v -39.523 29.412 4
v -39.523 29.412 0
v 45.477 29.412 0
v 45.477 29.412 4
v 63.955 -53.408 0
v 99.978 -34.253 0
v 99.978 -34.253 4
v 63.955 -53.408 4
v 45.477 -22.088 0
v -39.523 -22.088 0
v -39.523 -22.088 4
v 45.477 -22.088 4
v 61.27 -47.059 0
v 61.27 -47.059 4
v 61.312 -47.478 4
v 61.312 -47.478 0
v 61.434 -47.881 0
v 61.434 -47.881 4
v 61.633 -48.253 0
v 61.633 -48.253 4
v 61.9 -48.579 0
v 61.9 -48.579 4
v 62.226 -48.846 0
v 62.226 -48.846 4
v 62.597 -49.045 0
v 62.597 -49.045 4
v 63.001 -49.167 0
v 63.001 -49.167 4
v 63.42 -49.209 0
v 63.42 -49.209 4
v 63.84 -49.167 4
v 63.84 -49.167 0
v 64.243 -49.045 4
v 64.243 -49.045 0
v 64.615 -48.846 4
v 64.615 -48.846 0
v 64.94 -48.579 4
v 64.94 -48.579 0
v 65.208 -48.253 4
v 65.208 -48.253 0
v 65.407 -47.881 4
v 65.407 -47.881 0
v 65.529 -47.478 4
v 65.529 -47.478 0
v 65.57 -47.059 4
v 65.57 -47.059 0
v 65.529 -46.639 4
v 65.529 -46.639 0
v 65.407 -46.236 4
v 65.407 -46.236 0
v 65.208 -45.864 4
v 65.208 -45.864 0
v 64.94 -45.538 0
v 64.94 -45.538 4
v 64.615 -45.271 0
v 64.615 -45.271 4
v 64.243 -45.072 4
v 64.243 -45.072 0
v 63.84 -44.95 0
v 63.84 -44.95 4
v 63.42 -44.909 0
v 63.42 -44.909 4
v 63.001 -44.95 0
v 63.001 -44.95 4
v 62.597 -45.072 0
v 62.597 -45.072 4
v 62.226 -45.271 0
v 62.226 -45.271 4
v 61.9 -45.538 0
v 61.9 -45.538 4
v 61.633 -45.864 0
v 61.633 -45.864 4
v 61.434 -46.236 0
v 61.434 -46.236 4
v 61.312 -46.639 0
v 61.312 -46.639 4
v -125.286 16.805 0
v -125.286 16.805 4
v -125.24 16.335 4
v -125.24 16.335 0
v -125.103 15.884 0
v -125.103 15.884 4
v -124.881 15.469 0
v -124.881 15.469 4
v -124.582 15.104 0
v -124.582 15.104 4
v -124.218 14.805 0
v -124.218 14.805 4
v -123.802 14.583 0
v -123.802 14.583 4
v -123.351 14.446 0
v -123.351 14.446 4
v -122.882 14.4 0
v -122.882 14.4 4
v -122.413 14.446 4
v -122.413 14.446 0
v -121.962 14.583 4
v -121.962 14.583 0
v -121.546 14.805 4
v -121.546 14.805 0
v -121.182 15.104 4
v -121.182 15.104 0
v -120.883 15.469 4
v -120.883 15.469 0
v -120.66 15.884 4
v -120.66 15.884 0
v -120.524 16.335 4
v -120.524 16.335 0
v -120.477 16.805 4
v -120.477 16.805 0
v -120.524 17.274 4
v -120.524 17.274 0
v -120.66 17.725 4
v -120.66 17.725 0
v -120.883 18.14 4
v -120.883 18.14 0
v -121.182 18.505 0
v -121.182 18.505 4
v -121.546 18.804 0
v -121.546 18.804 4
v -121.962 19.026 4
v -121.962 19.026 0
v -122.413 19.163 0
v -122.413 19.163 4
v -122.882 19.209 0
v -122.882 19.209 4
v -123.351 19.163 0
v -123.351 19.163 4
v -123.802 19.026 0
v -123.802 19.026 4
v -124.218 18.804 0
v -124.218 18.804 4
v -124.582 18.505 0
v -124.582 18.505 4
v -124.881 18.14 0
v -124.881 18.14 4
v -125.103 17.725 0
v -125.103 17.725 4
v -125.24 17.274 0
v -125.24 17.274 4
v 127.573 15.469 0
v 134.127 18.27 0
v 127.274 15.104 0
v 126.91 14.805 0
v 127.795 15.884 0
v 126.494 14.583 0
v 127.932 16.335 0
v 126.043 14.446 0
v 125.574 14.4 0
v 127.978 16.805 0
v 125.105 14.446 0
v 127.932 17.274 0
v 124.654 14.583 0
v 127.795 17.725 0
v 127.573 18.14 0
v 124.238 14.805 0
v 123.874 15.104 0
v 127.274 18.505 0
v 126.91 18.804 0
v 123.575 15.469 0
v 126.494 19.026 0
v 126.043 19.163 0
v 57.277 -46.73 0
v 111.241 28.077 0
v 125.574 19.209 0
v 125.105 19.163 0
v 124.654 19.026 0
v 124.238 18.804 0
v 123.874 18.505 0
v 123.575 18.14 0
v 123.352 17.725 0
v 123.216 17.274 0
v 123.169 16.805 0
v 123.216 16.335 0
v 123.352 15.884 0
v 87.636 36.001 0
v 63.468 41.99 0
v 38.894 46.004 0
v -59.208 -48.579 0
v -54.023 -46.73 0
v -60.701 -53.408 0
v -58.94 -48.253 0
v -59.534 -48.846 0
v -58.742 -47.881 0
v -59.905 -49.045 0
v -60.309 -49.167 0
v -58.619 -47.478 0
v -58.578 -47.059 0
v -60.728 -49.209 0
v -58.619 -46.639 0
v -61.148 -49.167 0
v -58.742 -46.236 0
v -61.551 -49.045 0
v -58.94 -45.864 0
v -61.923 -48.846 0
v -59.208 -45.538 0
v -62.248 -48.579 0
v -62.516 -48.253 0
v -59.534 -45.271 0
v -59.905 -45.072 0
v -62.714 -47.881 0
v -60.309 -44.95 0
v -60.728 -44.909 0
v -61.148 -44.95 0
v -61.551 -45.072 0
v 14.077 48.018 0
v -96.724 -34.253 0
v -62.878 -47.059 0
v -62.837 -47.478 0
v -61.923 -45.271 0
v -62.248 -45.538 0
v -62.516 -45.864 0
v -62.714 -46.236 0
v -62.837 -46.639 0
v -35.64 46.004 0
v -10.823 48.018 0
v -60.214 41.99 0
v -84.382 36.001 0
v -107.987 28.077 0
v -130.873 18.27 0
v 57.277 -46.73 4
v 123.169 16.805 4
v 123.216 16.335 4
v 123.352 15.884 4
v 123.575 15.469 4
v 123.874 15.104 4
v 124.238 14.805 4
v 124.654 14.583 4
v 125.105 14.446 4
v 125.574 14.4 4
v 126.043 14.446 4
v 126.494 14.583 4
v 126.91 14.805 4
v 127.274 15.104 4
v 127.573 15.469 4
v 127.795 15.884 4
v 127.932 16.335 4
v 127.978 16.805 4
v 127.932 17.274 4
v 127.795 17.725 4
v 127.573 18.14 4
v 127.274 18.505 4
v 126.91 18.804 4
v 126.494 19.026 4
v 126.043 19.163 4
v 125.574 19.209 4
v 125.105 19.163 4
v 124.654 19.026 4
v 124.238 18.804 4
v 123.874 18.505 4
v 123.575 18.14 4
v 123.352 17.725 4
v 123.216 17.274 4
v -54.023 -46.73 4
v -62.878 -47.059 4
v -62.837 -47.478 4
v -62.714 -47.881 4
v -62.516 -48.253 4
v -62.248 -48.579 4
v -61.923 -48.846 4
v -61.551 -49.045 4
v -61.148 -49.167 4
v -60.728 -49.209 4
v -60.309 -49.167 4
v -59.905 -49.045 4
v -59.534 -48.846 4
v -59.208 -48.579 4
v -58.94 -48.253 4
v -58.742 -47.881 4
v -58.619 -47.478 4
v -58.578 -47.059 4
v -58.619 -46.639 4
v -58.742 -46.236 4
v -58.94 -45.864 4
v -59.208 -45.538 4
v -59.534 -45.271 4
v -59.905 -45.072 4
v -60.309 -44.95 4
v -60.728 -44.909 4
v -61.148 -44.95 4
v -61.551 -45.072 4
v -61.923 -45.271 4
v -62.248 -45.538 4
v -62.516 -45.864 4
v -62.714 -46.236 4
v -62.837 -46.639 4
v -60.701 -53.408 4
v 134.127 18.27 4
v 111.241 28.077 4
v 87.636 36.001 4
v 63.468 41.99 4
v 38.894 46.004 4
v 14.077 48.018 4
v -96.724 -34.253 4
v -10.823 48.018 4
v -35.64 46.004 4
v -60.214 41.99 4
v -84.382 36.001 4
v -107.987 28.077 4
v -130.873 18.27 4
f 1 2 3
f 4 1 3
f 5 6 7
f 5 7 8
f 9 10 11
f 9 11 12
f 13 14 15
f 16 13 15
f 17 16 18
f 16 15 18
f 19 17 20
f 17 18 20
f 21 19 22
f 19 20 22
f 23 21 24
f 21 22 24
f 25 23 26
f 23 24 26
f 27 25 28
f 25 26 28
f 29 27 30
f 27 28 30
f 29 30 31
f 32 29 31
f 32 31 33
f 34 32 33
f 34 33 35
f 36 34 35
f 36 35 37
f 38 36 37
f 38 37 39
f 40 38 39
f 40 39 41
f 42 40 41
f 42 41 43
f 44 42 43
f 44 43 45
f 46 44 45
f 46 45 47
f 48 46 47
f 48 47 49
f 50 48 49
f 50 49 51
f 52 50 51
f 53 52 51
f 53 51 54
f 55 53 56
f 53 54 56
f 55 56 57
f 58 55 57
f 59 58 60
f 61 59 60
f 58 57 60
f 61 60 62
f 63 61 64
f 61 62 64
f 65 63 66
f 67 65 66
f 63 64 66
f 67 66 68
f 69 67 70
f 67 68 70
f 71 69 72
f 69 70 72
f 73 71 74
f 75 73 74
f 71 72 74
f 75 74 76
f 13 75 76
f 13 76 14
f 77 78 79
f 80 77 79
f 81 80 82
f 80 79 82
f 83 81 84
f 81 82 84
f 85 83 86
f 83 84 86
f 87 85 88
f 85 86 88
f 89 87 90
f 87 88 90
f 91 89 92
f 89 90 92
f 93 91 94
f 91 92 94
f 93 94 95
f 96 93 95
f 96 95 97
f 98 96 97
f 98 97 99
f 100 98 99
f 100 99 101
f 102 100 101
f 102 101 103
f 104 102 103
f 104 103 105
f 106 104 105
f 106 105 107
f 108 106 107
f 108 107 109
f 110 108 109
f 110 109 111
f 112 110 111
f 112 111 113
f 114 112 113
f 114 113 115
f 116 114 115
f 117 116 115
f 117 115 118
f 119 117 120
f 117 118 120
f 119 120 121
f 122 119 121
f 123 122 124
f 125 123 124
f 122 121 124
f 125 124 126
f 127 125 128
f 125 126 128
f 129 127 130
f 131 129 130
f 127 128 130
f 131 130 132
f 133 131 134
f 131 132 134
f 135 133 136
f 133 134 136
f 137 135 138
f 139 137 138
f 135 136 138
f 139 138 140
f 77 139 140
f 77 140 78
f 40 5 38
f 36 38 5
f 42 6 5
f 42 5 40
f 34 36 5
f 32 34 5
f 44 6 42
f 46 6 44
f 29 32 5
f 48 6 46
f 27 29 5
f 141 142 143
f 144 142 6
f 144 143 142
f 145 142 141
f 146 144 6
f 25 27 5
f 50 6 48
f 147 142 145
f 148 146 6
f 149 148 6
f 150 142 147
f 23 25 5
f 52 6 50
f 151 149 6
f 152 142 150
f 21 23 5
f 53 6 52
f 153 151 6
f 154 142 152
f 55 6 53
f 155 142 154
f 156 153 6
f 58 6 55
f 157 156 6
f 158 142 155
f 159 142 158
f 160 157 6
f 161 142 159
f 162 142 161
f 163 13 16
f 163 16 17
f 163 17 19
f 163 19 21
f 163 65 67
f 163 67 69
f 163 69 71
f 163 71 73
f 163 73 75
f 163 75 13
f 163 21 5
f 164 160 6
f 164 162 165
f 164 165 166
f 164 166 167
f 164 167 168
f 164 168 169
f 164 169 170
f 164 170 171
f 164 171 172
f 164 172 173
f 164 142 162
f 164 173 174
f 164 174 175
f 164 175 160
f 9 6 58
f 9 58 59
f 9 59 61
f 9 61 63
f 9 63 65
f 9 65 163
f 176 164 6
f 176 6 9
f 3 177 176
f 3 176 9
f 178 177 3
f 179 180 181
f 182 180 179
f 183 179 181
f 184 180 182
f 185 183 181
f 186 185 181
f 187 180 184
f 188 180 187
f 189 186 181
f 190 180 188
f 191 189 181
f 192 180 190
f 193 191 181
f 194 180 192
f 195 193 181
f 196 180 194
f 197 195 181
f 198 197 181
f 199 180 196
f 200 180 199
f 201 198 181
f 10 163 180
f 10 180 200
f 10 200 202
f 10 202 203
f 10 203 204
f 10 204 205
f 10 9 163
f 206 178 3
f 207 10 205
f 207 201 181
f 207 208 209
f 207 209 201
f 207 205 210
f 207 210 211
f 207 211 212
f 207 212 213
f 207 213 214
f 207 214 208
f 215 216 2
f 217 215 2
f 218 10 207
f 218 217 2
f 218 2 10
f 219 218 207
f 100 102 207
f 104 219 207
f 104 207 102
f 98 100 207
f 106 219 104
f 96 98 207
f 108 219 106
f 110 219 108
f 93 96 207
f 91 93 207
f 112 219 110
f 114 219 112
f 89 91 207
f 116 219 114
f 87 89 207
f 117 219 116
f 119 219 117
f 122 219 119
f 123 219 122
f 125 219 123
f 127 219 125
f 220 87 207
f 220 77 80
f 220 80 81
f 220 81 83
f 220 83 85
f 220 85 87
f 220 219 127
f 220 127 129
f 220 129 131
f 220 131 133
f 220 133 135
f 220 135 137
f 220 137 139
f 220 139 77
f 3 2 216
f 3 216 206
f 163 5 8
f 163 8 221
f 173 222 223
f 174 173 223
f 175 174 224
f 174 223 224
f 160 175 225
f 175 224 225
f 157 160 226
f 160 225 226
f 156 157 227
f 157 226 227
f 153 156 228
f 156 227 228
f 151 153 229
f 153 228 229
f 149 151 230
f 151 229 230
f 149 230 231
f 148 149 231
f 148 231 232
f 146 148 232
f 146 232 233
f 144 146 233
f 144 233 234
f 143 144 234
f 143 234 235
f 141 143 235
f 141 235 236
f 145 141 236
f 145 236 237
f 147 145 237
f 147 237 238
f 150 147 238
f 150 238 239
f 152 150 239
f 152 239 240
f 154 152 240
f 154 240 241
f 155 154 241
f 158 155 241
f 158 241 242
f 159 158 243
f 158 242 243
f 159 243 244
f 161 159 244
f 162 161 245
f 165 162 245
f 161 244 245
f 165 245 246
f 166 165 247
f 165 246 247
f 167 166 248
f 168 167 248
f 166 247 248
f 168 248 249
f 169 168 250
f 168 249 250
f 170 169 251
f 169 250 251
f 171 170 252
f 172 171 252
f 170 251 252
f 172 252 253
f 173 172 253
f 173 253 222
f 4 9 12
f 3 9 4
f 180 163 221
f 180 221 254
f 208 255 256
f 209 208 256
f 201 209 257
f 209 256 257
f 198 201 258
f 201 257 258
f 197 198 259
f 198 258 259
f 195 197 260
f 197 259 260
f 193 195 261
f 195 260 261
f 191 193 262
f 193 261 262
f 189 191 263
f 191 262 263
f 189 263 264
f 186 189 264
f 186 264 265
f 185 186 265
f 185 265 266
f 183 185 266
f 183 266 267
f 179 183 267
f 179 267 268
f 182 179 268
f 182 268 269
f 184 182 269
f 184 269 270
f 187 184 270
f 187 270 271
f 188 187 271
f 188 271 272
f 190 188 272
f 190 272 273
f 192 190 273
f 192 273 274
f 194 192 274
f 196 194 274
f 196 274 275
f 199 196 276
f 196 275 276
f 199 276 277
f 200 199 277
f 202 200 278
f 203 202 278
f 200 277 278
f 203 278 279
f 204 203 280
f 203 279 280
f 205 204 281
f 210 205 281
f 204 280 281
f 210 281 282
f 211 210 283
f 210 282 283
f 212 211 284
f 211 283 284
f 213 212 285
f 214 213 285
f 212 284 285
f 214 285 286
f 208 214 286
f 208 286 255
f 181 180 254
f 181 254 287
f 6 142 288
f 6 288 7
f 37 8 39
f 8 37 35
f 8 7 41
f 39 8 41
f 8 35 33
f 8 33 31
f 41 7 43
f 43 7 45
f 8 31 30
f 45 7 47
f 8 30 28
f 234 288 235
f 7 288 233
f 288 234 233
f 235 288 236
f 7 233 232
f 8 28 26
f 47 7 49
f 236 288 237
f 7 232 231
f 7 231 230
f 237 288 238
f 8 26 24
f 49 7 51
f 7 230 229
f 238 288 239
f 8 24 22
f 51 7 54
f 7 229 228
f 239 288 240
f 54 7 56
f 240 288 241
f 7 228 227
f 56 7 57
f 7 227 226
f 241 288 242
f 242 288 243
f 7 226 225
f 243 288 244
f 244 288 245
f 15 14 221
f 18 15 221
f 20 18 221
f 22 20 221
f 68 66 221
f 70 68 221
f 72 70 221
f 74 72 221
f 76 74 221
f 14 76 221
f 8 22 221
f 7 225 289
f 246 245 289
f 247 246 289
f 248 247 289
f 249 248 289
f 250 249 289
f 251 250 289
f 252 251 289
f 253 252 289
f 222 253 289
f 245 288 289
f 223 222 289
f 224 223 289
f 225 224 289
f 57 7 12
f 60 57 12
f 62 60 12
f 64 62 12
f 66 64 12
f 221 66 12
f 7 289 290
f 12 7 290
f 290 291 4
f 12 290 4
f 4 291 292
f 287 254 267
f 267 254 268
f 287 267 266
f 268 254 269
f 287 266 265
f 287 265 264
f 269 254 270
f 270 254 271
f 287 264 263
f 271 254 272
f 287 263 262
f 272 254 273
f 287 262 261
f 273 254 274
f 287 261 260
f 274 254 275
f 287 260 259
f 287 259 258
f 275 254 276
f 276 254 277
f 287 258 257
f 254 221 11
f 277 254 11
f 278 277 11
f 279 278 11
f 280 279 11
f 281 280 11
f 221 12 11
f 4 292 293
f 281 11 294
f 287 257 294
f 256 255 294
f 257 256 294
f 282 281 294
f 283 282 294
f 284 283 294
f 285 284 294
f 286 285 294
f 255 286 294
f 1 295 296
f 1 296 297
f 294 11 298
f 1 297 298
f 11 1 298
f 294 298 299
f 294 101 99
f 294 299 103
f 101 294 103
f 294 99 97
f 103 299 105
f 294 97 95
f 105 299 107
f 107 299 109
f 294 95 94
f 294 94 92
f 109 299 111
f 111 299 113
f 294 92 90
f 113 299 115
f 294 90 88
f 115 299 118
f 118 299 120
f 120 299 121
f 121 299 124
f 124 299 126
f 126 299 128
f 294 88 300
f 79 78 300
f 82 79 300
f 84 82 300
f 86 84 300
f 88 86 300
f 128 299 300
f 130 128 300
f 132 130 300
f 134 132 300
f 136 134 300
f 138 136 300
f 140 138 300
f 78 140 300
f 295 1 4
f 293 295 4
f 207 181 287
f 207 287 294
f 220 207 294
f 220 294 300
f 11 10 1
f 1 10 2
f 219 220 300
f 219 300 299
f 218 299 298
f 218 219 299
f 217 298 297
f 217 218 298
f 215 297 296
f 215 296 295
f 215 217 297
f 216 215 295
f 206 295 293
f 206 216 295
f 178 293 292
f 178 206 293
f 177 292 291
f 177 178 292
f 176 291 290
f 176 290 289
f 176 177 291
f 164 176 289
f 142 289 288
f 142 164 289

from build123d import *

# Parameters (mm, degrees)
BOSS_EXTRUDE1_DEPTH = 4
SKETCH2_W           = 85
SKETCH2_H           = 51.5
CUT_EXTRUDE1_DEPTH  = 20
CUT_EXTRUDE3_START  = 10
SKETCH3_R           = 2.404549827
SKETCH3_R_2         = 2.15
CUT_EXTRUDE3_DEPTH  = 20


with BuildPart() as part:
    # Sketch1 → Boss-Extrude1 (new body)
    with BuildSketch(Plane.XY):
        with BuildLine():
            Line((-54.022988506, -46.729885057), (-60.700936328, -53.40783288))
            Line((-60.700936328, -53.40783288), (-96.723977713, -34.253129761))
            Line((-96.723977713, -34.253129761), (-130.872988506, 18.270114943))
            ThreePointArc((-130.872988506, 18.270114943), (1.627011494, 48.270114943), (134.127011494, 18.270114943))
            Line((134.127011494, 18.270114943), (99.978000701, -34.253129761))
            Line((99.978000701, -34.253129761), (63.954959317, -53.40783288))
            Line((63.954959317, -53.40783288), (57.277011494, -46.729885057))
            Line((57.277011494, -46.729885057), (-54.022988506, -46.729885057))
        make_face()
    extrude(amount=BOSS_EXTRUDE1_DEPTH)

    # Sketch2 → Cut-Extrude1 (cut)
    with BuildSketch(Plane.XY):
        with Locations((2.977011494, 3.662316168)):
            Rectangle(SKETCH2_W, SKETCH2_H)
    extrude(amount=CUT_EXTRUDE1_DEPTH, mode=Mode.SUBTRACT)

    # Sketch3 → Cut-Extrude3 (cut)
    with BuildSketch(Plane.XY.offset(CUT_EXTRUDE3_START)):
        with Locations(Location((-122.881880972, 16.804537187, 0), (0, 0, 180))):
            Circle(SKETCH3_R)
        with Locations(Location((-60.728139954, -47.058565961, 0), (0, 0, 180))):
            Circle(SKETCH3_R_2)
        with Locations(Location((63.420208839, -47.058565961, 0), (0, 0, 180))):
            Circle(SKETCH3_R_2)
        with Locations(Location((125.573949857, 16.804537187, 0), (0, 0, 180))):
            Circle(SKETCH3_R)
    extrude(amount=-CUT_EXTRUDE3_DEPTH, mode=Mode.SUBTRACT)


solid = part.part
